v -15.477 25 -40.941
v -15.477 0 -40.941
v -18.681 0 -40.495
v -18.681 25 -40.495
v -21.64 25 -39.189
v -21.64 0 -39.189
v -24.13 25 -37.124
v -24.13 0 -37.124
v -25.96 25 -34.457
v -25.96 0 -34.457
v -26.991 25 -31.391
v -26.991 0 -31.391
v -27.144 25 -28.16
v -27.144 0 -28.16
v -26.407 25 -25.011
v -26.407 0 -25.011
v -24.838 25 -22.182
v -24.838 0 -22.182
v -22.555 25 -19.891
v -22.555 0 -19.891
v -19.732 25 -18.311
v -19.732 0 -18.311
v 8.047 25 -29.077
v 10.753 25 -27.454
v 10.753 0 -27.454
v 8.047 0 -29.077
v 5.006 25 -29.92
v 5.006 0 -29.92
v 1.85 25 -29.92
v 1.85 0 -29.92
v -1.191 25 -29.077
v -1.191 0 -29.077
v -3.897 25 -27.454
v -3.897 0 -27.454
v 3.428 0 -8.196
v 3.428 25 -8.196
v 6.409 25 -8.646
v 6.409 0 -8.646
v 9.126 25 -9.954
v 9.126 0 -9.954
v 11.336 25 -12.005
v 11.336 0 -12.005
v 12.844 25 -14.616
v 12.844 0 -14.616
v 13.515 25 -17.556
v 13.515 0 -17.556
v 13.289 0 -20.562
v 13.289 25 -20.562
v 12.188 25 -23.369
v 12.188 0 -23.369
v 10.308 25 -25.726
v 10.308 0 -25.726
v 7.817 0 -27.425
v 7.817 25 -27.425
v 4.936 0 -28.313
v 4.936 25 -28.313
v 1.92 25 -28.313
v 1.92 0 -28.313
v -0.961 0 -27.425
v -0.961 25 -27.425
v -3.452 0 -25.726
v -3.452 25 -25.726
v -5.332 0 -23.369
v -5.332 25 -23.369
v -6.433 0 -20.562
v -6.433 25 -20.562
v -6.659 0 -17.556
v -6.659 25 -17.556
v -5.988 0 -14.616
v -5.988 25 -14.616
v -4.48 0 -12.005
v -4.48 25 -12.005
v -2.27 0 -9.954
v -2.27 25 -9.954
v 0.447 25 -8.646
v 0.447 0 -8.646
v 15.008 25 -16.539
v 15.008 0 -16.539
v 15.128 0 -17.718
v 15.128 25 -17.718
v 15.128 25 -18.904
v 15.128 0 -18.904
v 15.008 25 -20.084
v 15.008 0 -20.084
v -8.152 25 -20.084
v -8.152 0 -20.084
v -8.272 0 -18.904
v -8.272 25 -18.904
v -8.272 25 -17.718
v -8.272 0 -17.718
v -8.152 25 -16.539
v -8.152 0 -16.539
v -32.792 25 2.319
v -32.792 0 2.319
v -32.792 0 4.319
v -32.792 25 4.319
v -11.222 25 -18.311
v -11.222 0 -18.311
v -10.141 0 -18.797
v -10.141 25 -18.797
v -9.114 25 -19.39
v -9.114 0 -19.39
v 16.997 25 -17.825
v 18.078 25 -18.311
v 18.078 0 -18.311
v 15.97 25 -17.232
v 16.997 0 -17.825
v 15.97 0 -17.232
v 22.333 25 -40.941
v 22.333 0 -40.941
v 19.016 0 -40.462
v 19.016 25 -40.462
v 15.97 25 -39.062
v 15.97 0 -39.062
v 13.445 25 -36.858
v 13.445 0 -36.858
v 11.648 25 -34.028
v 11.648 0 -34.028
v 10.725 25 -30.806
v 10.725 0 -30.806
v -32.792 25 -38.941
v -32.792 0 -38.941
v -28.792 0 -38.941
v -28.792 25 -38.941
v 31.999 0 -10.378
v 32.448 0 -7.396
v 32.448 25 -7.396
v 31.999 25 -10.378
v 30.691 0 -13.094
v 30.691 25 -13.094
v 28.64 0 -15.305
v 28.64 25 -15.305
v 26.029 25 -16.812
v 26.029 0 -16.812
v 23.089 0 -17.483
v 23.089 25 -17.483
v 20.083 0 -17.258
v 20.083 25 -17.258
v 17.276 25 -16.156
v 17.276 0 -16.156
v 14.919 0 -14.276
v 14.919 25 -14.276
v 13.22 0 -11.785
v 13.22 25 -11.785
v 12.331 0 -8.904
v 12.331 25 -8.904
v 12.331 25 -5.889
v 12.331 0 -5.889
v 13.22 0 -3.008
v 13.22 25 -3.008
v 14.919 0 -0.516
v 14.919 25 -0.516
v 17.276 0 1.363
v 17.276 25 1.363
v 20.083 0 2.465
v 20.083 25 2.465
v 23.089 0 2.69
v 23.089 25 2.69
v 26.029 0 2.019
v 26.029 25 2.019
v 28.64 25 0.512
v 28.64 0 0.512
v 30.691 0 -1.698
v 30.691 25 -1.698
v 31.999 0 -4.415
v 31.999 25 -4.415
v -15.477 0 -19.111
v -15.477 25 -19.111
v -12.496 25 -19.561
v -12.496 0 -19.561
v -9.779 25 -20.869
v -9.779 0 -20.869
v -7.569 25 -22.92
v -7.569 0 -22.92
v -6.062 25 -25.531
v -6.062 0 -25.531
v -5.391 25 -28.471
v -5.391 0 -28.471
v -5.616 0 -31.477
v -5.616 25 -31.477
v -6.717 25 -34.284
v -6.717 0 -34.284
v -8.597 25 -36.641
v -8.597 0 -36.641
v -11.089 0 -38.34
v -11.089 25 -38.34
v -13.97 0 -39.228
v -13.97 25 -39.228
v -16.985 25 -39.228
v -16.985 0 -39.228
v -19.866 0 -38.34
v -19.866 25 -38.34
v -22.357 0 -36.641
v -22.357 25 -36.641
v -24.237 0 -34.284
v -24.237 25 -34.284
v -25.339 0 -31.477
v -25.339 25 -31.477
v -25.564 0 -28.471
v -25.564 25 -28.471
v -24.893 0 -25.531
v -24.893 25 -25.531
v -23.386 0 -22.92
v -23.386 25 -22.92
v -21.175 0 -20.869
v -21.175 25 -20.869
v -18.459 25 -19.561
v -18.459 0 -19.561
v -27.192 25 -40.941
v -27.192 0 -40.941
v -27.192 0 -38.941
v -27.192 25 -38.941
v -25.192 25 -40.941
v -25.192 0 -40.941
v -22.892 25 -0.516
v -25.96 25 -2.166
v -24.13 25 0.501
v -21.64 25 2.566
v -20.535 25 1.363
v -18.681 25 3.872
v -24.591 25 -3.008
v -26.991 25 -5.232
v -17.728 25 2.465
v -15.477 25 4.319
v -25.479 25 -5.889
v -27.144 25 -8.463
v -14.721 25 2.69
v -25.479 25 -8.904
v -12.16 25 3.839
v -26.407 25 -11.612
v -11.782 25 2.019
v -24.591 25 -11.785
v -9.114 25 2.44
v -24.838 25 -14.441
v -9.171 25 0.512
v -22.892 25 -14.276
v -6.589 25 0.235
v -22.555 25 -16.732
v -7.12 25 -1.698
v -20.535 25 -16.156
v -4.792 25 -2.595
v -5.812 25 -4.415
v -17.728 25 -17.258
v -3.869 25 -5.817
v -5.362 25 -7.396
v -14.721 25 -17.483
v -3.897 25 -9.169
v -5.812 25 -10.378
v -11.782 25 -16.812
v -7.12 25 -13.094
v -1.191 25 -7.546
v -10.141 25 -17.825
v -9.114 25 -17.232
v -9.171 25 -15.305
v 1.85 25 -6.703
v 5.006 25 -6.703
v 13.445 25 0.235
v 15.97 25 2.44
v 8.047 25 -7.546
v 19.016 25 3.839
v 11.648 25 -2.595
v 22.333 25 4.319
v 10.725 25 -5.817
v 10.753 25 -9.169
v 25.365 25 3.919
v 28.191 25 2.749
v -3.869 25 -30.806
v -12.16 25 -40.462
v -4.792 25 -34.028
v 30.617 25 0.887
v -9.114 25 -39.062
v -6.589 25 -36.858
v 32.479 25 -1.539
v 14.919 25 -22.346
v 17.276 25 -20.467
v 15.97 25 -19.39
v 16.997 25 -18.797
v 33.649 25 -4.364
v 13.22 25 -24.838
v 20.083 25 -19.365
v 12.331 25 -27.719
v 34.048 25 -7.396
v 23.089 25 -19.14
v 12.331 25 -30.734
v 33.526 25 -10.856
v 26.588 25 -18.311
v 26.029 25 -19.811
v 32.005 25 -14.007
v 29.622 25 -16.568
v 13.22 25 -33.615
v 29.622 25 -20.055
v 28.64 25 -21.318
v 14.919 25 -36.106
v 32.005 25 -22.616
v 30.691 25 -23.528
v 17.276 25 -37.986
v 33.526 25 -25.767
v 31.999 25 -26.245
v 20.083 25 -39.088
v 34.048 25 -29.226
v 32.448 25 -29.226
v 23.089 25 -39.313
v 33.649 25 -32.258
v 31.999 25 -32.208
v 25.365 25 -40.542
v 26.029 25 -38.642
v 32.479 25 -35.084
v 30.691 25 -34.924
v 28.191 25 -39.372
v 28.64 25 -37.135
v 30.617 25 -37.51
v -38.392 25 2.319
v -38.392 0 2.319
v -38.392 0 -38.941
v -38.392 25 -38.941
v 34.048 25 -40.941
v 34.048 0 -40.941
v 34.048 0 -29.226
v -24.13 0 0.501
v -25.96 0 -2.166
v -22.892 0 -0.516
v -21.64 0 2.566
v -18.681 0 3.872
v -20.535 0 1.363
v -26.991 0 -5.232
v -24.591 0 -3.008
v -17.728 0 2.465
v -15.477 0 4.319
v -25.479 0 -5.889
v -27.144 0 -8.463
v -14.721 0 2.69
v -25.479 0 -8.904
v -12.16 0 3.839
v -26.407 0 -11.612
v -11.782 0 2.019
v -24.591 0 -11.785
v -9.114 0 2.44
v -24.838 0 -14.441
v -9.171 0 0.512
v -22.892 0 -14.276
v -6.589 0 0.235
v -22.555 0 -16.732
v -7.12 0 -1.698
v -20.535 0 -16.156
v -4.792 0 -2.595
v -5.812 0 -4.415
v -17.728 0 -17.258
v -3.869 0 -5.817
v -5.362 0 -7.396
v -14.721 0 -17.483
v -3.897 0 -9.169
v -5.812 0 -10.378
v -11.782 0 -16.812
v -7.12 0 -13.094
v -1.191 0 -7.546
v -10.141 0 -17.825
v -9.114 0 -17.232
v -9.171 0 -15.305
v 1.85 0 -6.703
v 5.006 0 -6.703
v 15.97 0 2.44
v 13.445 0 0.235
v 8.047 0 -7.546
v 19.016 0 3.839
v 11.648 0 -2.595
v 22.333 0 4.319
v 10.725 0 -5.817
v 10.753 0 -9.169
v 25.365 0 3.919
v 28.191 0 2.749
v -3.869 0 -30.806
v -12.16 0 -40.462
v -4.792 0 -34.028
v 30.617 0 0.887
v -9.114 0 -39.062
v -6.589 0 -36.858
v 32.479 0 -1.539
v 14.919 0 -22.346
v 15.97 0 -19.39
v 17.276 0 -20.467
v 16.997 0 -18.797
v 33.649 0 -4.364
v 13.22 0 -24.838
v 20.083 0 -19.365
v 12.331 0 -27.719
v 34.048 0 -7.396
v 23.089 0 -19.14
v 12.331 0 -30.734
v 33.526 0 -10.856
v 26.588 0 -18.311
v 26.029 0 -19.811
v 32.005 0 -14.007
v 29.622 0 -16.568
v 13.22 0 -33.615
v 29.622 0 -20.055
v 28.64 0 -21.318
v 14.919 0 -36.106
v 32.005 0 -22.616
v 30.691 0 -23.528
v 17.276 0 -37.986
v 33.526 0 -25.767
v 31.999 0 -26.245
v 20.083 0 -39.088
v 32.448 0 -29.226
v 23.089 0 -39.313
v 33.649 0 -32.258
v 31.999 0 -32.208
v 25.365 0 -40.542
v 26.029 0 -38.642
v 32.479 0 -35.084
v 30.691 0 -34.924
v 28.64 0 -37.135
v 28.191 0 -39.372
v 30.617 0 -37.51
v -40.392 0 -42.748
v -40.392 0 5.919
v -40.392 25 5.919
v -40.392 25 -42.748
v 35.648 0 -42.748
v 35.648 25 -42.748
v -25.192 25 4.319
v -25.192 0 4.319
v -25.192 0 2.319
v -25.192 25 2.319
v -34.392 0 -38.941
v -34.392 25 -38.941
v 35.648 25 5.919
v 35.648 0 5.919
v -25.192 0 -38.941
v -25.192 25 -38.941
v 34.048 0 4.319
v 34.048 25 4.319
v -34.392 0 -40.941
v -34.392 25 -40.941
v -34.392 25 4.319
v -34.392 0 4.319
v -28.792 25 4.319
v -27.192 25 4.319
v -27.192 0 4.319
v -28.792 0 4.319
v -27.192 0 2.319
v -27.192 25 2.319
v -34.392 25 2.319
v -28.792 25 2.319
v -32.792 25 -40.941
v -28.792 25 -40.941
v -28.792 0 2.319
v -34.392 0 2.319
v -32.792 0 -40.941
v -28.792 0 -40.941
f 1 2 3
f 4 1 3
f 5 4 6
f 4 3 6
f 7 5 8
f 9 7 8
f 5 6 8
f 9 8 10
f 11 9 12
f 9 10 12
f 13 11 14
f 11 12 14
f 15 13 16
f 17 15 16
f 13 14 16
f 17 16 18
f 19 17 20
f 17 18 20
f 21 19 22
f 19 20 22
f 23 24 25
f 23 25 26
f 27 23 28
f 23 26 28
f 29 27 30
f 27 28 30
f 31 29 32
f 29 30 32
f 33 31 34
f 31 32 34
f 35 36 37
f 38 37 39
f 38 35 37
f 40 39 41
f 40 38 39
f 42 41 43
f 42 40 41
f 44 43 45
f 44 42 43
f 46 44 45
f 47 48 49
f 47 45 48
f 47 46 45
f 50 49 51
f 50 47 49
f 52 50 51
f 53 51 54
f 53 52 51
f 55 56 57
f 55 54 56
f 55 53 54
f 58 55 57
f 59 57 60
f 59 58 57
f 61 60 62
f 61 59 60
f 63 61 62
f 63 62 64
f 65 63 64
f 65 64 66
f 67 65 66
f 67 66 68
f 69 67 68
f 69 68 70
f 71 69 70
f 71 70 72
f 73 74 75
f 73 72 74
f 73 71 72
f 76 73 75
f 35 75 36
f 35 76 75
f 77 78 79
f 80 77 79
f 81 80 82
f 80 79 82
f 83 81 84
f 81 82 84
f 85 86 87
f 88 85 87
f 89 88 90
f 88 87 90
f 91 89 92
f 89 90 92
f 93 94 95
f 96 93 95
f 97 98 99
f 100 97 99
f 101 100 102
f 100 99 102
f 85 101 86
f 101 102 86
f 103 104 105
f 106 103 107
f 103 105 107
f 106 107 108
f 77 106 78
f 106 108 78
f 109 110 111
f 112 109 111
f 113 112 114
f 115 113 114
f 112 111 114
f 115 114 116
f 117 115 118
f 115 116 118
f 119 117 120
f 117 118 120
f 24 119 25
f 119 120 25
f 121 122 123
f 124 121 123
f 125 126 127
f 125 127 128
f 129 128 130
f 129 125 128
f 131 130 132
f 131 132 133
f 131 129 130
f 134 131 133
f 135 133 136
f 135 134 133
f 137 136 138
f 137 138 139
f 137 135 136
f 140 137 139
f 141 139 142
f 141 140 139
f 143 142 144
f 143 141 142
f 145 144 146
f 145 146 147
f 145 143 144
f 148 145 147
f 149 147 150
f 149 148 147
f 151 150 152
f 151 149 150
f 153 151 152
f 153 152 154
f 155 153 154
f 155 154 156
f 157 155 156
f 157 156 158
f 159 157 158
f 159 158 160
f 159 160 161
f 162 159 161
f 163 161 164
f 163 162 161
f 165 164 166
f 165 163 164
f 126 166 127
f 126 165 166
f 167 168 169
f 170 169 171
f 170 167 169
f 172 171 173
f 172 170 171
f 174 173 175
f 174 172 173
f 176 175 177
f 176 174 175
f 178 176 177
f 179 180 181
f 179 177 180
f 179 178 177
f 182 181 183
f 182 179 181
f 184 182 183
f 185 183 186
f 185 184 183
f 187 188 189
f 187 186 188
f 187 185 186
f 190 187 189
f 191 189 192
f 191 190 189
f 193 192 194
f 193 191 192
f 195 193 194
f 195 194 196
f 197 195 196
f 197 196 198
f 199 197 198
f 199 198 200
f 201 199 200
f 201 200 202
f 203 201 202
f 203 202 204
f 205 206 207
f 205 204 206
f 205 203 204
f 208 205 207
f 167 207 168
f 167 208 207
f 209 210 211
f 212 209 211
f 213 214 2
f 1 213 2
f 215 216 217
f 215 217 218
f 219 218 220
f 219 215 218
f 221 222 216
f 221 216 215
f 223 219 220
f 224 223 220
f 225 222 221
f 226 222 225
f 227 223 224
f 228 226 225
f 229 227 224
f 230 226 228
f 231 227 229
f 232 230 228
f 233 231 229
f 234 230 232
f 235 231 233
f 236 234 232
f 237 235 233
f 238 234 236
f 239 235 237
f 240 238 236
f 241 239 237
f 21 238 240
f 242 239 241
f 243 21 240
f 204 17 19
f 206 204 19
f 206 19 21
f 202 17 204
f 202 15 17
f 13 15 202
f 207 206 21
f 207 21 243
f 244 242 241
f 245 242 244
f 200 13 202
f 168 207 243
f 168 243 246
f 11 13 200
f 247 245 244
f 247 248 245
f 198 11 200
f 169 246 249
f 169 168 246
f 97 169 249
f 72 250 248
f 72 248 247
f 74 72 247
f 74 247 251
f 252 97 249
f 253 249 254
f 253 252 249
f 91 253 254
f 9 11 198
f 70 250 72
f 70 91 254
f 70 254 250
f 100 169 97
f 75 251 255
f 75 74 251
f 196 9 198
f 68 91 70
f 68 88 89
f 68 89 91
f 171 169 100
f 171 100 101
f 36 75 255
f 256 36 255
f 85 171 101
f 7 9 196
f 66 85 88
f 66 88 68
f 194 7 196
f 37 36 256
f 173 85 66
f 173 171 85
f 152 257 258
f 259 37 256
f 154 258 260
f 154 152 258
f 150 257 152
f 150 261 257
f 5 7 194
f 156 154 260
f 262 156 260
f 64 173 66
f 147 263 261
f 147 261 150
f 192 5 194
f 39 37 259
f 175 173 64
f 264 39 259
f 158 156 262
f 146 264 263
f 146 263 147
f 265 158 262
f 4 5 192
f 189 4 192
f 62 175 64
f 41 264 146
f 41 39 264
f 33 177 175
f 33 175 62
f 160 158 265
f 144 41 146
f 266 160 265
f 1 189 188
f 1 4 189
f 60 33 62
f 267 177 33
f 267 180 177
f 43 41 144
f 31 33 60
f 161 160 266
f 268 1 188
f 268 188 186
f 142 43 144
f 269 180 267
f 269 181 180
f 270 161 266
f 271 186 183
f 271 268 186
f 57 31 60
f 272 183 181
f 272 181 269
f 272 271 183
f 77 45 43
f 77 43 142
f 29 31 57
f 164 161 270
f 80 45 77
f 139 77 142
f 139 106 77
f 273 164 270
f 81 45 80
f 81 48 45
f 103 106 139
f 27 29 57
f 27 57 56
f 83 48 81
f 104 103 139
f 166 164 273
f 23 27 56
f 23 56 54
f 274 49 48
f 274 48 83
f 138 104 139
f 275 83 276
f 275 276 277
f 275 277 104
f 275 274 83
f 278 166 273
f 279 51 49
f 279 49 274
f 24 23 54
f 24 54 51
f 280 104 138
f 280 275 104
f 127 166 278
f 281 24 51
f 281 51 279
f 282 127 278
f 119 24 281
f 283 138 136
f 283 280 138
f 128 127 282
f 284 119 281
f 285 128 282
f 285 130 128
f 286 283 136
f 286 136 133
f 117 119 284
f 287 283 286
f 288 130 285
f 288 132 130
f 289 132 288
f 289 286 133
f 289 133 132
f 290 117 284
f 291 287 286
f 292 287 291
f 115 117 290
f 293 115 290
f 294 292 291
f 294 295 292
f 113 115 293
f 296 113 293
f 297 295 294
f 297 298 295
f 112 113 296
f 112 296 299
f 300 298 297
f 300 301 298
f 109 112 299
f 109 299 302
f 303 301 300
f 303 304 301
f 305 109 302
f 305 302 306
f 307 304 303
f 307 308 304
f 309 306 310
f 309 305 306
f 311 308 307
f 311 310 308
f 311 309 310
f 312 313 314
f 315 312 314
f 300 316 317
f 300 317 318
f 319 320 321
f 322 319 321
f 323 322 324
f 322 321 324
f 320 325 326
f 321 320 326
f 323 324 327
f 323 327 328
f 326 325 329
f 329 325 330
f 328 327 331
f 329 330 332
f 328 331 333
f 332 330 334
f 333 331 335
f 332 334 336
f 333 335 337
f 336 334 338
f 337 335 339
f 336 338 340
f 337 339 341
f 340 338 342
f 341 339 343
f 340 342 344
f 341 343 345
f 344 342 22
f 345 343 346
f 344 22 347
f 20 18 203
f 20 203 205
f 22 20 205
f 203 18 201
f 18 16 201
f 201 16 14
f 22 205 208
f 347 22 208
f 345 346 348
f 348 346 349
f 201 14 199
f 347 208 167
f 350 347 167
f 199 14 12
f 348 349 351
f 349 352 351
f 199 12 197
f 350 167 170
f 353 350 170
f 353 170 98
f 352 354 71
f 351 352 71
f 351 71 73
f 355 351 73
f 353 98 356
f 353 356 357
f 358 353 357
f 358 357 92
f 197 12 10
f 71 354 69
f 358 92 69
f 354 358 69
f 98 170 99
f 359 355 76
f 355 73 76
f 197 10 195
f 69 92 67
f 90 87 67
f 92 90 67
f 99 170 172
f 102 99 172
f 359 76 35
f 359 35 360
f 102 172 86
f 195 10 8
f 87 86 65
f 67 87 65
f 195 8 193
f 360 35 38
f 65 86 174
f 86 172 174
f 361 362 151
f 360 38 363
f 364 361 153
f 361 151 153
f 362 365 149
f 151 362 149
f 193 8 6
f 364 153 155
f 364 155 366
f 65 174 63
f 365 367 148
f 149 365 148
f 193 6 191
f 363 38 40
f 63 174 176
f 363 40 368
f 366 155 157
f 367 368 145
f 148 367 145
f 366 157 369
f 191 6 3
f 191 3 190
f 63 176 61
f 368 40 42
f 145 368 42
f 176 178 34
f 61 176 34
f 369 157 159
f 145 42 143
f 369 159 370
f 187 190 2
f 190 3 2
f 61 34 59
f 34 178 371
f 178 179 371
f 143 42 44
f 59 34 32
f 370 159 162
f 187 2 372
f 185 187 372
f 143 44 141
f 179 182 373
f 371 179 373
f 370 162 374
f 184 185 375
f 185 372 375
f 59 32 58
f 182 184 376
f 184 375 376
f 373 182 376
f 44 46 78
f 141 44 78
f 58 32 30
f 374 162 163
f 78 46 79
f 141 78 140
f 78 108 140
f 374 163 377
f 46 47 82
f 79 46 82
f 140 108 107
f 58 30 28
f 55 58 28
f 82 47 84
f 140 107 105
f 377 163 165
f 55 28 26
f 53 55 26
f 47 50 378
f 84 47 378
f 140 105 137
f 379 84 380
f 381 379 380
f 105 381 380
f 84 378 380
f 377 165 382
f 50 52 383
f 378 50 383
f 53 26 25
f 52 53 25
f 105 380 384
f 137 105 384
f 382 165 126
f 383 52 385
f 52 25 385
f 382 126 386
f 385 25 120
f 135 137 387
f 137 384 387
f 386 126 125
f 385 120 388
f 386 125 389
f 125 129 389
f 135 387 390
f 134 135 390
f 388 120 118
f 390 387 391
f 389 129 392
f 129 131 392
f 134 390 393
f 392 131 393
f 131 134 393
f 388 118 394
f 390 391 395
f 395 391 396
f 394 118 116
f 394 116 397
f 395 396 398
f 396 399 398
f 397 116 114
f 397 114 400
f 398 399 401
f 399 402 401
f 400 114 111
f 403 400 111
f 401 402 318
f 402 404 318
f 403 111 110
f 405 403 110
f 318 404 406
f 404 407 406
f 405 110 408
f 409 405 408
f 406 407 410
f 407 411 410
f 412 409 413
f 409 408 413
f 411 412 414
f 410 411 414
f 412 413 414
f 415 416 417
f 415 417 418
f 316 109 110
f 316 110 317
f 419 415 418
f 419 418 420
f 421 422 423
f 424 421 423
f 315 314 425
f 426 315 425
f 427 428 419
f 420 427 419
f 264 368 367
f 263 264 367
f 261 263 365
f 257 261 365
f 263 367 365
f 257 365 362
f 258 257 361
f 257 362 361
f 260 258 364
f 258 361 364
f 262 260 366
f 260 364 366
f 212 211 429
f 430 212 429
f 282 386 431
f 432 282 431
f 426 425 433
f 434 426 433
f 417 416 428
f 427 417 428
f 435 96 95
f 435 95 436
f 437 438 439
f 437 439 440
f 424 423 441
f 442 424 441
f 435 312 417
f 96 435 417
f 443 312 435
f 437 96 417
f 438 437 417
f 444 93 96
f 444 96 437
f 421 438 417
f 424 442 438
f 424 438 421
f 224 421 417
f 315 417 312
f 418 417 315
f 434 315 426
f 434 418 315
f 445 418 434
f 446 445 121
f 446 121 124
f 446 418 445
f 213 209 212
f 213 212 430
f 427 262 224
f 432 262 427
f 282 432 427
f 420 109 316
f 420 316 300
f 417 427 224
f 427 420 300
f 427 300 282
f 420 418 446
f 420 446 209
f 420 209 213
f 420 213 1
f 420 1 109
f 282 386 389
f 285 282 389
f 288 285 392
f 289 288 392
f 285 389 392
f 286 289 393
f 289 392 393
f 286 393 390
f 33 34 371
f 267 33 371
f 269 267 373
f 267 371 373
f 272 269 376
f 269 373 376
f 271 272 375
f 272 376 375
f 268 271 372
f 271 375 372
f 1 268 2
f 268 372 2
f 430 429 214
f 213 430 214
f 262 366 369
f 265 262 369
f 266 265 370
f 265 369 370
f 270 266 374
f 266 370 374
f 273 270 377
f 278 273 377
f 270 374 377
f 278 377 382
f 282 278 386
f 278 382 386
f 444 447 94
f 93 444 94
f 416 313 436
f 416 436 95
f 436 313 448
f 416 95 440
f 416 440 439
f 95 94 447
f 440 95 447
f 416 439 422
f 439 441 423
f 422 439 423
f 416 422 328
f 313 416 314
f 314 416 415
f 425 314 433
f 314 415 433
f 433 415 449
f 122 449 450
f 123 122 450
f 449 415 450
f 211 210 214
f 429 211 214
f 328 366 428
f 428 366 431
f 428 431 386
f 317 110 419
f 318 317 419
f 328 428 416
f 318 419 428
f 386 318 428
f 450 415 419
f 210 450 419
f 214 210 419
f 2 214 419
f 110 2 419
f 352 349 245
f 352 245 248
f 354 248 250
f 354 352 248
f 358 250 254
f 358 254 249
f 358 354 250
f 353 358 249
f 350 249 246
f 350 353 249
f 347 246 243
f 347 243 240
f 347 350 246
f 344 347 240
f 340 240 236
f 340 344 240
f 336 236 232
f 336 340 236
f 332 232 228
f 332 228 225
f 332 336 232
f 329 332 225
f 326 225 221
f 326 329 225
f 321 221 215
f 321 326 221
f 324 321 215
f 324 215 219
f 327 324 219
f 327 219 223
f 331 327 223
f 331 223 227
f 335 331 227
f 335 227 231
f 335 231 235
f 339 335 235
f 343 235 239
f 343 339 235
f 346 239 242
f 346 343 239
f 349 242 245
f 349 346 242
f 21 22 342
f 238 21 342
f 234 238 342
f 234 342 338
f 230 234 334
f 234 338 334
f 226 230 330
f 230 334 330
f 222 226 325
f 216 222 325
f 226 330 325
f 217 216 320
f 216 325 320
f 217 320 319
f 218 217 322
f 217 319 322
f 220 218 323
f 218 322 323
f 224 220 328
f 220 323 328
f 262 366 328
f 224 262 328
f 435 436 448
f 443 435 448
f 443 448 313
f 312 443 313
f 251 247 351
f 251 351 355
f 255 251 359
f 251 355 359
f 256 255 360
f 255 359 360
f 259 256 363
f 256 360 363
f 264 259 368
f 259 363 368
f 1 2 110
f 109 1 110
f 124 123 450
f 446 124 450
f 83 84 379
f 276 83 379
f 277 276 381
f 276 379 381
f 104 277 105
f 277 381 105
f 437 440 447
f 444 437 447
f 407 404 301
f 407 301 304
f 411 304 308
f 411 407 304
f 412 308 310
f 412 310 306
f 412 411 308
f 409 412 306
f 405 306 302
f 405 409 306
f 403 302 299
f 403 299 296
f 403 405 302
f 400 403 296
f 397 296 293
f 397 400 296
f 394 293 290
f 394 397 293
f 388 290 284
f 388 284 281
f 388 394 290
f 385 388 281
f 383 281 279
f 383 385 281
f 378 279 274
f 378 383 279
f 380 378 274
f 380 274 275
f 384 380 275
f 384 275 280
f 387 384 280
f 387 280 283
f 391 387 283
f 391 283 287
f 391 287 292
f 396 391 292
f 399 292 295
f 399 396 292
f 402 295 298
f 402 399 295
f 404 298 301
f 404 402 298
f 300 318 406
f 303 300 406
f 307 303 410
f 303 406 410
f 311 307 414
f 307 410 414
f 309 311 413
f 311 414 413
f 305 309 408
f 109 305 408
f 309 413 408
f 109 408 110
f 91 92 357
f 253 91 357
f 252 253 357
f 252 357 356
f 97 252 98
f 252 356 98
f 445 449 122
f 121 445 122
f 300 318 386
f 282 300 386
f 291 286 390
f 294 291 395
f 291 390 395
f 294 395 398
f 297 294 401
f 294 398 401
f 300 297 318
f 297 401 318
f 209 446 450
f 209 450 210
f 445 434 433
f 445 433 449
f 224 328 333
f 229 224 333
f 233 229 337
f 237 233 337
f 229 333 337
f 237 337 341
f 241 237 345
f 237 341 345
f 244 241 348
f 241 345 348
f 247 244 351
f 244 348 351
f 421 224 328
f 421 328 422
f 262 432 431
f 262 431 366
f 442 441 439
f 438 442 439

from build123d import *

# Parameters (mm, degrees)
SKETCH1_R             = 10.115000047
BOSS_EXTRUDE4_DEPTH   = 25
SKETCH1_W             = 76.040669035
SKETCH1_H             = 48.666950676
BOSS_EXTRUDE4_2_DEPTH = 25
SKETCH1_9_R           = 10.115000047
CUT_EXTRUDE1_DEPTH    = 36


with BuildPart() as part:
    # Sketch1 → Boss-Extrude4 (new body)
    with BuildSketch(Plane(origin=(0, 0, 0), x_dir=(1, 0, 0), z_dir=(0, 1, 0))):
        with BuildLine():
            ThreePointArc((22.33335059, 40.941406253), (13.444930876, 36.857737704), (10.753243591, 27.45373997))
            ThreePointArc((10.753243591, 27.45373997), (3.42801602, 30.026406253), (-3.897211552, 27.45373997))
            ThreePointArc((-3.897211552, 27.45373997), (-6.588898838, 36.857737705), (-15.477318554, 40.941406253))
            ThreePointArc((-15.477318554, 40.941406253), (-26.990581515, 31.391123299), (-19.732197967, 18.3114063))
            ThreePointArc((-19.732197967, 18.3114063), (-26.990581514, 5.231689296), (-15.477318545, -4.318593653))
            ThreePointArc((-15.477318545, -4.318593653), (-6.588898835, -0.234925102), (-3.897211552, 9.16907263))
            ThreePointArc((-3.897211552, 9.16907263), (3.42801602, 6.596406347), (10.753243591, 9.16907263))
            ThreePointArc((10.753243591, 9.16907263), (13.444930875, -0.234925102), (22.333350586, -4.318593653))
            ThreePointArc((22.333350586, -4.318593653), (30.617106493, -0.887349608), (34.048350537, 7.3964063))
            ThreePointArc((34.048350537, 7.3964063), (32.005142976, 14.006826546), (26.588230006, 18.3114063))
            ThreePointArc((26.588230006, 18.3114063), (32.005142976, 22.615986054), (34.048350537, 29.2264063))
            ThreePointArc((34.048350537, 29.2264063), (30.617106494, 37.510162206), (22.33335059, 40.941406253))
        make_face()
        with Locations((22.333350584, 29.2264063)):
            Circle(SKETCH1_R, mode=Mode.SUBTRACT)
        with BuildLine():
            ThreePointArc((15.008123013, 20.08407263), (16.475850608, 19.080918735), (18.078471162, 18.3114063))
            ThreePointArc((18.078471162, 18.3114063), (16.475850608, 17.541893865), (15.008123013, 16.53873997))
            ThreePointArc((15.008123013, 16.53873997), (15.143015973, 18.3114063), (15.008123013, 20.08407263))
        make_face(mode=Mode.SUBTRACT)
        with Locations((22.333350584, 7.3964063)):
            Circle(SKETCH1_R, mode=Mode.SUBTRACT)
        with BuildLine():
            ThreePointArc((-8.152090974, 16.53873997), (-9.619818569, 17.541893865), (-11.222439123, 18.3114063))
            ThreePointArc((-11.222439123, 18.3114063), (-9.619818569, 19.080918735), (-8.152090974, 20.08407263))
            ThreePointArc((-8.152090974, 20.08407263), (-8.286983933, 18.3114063), (-8.152090974, 16.53873997))
        make_face(mode=Mode.SUBTRACT)
        with Locations((-15.477318545, 7.3964063)):
            Circle(SKETCH1_R, mode=Mode.SUBTRACT)
    extrude(amount=BOSS_EXTRUDE4_DEPTH)

    # Sketch1<9> → Cut-Extrude1 (cut)
    with BuildSketch(Plane(origin=(0, 0, 0), x_dir=(1, 0, 0), z_dir=(0, 1, 0))):
        with Locations((3.42801602, 18.3114063)):
            Circle(SKETCH1_9_R)
        with Locations((-15.477318545, 29.2264063)):
            Circle(SKETCH1_9_R)
    extrude(amount=CUT_EXTRUDE1_DEPTH, mode=Mode.SUBTRACT)


with BuildPart() as body_2:
    # Sketch1 → Boss-Extrude4 2 (new body)
    with BuildSketch(Plane(origin=(0, 0, 0), x_dir=(1, 0, 0), z_dir=(0, 1, 0))):
        with Locations((-2.371983981, 18.414881685)):
            Rectangle(SKETCH1_W, SKETCH1_H)
        Polygon((-25.192318498, 38.941406253), (-25.192318498, 40.941406253), (-15.477318554, 40.941406253), (22.33335059, 40.941406253), (34.048350537, 40.941406253), (34.048350537, 29.2264063), (34.048350537, 7.3964063), (34.048350537, -4.318593653), (22.333350586, -4.318593653), (-15.477318545, -4.318593653), (-25.192318498, -4.318593653), (-25.192318498, -2.318593653), (-27.192318498, -2.318593653), (-27.192318498, -4.318593653), (-28.792318498, -4.318593653), (-28.792318498, -2.318593653), (-32.792318498, -2.318593653), (-32.792318498, -4.318593653), (-34.392318498, -4.318593653), (-34.392318498, -2.318593653), (-38.392318498, -2.318593653), (-38.392318498, 38.941406253), (-34.392318498, 38.941406253), (-34.392318498, 40.941406253), (-32.792318498, 40.941406253), (-32.792318498, 38.941406253), (-28.792318498, 38.941406253), (-28.792318498, 40.941406253), (-27.192318498, 40.941406253), (-27.192318498, 38.941406253), align=None, mode=Mode.SUBTRACT)
    extrude(amount=BOSS_EXTRUDE4_2_DEPTH)


solid = Compound([part.part, body_2.part])
